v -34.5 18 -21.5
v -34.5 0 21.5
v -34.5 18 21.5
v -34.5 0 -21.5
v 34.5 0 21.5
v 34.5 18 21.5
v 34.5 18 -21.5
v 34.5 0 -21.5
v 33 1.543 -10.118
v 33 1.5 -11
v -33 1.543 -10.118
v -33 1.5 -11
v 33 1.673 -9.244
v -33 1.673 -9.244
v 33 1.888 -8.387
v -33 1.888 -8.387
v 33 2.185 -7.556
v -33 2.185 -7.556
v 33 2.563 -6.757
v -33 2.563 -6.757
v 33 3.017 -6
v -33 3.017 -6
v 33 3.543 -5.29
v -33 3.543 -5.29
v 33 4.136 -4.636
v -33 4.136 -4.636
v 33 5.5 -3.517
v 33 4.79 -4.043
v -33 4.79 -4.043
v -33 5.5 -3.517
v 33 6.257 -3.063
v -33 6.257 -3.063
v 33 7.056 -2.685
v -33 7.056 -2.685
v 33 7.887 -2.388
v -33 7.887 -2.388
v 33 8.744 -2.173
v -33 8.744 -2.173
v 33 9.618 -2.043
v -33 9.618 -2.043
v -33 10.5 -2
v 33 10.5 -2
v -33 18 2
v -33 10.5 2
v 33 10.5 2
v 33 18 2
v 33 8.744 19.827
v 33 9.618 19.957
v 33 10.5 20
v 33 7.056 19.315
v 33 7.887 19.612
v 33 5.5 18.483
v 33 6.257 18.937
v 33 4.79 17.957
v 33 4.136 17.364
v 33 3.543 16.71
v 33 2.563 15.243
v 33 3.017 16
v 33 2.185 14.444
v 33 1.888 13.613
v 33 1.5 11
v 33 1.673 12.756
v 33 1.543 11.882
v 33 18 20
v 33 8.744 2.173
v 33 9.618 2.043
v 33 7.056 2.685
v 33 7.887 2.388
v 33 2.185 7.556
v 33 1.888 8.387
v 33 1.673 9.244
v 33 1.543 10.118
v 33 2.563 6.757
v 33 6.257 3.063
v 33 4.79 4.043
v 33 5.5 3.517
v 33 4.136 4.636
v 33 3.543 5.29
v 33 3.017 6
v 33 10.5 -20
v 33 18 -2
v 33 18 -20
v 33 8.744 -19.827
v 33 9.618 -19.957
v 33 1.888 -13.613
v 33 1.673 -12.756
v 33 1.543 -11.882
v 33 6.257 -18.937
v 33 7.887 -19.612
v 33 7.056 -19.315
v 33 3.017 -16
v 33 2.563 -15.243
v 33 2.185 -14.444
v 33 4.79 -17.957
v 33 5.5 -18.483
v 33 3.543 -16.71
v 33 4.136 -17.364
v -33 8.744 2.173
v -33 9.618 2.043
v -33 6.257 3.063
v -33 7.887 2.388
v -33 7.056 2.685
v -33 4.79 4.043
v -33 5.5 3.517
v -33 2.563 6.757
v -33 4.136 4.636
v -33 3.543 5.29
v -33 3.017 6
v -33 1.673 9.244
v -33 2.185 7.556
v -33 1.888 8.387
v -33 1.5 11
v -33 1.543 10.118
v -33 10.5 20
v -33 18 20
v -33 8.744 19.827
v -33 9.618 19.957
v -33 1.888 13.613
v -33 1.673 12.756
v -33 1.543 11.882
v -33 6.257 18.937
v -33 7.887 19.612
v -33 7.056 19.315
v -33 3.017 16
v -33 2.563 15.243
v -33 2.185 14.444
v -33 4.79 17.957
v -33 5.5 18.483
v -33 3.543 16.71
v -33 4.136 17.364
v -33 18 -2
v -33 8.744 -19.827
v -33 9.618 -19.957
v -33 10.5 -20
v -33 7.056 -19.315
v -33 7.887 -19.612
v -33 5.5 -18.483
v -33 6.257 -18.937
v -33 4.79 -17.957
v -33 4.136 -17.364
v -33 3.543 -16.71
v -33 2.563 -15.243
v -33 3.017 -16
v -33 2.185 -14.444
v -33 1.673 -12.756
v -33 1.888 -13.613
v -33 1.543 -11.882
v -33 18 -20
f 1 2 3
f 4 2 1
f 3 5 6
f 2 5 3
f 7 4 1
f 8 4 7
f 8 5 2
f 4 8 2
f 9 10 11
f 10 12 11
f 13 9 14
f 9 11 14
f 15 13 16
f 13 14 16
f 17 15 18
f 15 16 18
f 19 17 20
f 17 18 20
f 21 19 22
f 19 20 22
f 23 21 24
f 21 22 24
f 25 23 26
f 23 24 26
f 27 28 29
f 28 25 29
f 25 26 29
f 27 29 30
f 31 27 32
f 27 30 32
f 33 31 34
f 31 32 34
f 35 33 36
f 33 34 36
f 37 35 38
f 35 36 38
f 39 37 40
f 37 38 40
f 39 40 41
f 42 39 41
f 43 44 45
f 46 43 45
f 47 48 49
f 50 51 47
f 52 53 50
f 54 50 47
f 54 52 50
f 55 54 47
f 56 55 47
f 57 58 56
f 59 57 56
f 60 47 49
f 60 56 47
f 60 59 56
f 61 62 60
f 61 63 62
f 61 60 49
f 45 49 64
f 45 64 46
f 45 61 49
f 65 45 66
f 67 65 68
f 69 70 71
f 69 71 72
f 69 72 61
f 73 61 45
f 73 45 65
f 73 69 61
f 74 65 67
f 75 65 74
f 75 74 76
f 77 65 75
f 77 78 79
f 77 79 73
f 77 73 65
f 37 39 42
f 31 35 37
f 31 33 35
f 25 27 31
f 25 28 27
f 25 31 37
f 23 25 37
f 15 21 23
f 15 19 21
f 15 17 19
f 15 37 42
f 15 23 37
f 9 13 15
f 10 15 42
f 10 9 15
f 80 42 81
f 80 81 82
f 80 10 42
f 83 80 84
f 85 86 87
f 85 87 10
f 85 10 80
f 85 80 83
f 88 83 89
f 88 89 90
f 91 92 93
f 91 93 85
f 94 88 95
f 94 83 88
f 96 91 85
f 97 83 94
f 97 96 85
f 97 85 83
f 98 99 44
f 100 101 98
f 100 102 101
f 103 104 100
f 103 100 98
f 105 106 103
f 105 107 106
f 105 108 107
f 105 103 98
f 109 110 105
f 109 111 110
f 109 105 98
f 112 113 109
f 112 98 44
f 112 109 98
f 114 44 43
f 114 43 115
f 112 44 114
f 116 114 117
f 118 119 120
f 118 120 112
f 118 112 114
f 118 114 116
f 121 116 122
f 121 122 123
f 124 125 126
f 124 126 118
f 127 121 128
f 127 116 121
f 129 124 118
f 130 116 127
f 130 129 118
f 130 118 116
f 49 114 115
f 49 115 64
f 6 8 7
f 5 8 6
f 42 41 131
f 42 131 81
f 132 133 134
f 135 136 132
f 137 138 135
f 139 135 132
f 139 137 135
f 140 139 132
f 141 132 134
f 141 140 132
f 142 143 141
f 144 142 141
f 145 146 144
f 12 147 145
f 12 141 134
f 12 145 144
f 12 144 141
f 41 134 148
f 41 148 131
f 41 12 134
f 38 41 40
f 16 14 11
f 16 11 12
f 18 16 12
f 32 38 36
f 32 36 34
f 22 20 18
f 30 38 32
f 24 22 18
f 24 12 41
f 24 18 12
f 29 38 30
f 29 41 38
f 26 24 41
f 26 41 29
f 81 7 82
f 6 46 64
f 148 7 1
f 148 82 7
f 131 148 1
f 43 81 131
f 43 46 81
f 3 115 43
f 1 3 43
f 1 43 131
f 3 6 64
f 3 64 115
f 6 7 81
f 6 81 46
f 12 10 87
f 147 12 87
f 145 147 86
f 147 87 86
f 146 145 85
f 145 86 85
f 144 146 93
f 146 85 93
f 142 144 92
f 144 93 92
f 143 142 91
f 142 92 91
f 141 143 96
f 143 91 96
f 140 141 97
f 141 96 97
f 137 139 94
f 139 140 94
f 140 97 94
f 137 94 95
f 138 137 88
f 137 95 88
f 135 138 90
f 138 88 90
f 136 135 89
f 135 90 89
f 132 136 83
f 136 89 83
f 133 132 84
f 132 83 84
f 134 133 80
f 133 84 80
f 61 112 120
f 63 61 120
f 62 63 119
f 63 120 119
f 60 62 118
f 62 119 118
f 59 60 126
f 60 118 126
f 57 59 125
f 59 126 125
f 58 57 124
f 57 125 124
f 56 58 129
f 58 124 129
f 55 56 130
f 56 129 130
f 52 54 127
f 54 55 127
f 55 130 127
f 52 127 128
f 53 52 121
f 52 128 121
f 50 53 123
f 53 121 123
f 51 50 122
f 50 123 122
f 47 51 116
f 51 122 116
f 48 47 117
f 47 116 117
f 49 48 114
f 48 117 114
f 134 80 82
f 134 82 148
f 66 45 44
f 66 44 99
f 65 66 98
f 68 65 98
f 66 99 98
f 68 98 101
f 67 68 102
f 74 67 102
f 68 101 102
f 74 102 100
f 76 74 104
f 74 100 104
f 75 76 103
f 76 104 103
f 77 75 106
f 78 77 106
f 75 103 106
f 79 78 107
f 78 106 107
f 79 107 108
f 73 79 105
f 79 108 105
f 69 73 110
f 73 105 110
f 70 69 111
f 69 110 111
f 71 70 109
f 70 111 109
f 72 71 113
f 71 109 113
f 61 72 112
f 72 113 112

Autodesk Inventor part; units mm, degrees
ref_plane "YZ Plane" through (0, 0, 0) normal (1, 0, 0) x (0, 1, 0)
ref_plane "XZ Plane" through (0, 0, 0) normal (0, 1, 0) x (-1, 0, 0)
ref_plane "XY Plane" through (0, 0, 0) normal (0, 0, 1) x (1, 0, 0)
sketch "Sketch1" plane through (0, 0, 0) normal (0, 1, 0) x (-1, 0, 0)
  line L0 (33, 20) -> (-33, 20)
  line L1 (-33, 20) -> (-33, -20)
  line L2 (-33, -20) -> (33, -20)
  line L3 (33, -20) -> (33, 20)
  line L4 (33, 2) -> (-33, 2)
  line L5 (33, -2) -> (-33, -2)
  line L6 (-34.5, 21.5) -> (34.5, 21.5)
  line L7 (34.5, 21.5) -> (34.5, -21.5)
  line L8 (34.5, -21.5) -> (-34.5, -21.5)
  line L9 (-34.5, -21.5) -> (-34.5, 21.5)
  point P0 (0, 0)
  dimension "d0" = 66
  dimension "d1" = 33
  dimension "d2" = 40
  dimension "d3" = 20
  dimension "d4" = 18
  dimension "d5" = 18
  dimension "d6" = 1.5
extrude "Extrusion1" add sketch "Sketch1" along normal blind 1.5 contours L3 L4 L1 L0 | L3 L5 L1 L4 | L3 L2 L1 L5 | L6 L7 L8 L9
sketch "Sketch2" plane through (0, 1.5, 0) normal (0, 1, 0) x (1, 0, 0)
  point P0 (0, 0)
extrude "Extrusion2" add sketch "Sketch1" along normal blind 18 contours L3 L5 L1 L4 | L6 L7 L8 L9
fillet "Fillet1" radius 9 4 edges at (0, 1.5, 2) (0, 1.5, 20) (0, 1.5, -2) (0, 1.5, -20)
equation "\"d1\" = 0.5 * d0"
equation "\"d3\" = 0.5 * d2"
properties part number "battery rack"
